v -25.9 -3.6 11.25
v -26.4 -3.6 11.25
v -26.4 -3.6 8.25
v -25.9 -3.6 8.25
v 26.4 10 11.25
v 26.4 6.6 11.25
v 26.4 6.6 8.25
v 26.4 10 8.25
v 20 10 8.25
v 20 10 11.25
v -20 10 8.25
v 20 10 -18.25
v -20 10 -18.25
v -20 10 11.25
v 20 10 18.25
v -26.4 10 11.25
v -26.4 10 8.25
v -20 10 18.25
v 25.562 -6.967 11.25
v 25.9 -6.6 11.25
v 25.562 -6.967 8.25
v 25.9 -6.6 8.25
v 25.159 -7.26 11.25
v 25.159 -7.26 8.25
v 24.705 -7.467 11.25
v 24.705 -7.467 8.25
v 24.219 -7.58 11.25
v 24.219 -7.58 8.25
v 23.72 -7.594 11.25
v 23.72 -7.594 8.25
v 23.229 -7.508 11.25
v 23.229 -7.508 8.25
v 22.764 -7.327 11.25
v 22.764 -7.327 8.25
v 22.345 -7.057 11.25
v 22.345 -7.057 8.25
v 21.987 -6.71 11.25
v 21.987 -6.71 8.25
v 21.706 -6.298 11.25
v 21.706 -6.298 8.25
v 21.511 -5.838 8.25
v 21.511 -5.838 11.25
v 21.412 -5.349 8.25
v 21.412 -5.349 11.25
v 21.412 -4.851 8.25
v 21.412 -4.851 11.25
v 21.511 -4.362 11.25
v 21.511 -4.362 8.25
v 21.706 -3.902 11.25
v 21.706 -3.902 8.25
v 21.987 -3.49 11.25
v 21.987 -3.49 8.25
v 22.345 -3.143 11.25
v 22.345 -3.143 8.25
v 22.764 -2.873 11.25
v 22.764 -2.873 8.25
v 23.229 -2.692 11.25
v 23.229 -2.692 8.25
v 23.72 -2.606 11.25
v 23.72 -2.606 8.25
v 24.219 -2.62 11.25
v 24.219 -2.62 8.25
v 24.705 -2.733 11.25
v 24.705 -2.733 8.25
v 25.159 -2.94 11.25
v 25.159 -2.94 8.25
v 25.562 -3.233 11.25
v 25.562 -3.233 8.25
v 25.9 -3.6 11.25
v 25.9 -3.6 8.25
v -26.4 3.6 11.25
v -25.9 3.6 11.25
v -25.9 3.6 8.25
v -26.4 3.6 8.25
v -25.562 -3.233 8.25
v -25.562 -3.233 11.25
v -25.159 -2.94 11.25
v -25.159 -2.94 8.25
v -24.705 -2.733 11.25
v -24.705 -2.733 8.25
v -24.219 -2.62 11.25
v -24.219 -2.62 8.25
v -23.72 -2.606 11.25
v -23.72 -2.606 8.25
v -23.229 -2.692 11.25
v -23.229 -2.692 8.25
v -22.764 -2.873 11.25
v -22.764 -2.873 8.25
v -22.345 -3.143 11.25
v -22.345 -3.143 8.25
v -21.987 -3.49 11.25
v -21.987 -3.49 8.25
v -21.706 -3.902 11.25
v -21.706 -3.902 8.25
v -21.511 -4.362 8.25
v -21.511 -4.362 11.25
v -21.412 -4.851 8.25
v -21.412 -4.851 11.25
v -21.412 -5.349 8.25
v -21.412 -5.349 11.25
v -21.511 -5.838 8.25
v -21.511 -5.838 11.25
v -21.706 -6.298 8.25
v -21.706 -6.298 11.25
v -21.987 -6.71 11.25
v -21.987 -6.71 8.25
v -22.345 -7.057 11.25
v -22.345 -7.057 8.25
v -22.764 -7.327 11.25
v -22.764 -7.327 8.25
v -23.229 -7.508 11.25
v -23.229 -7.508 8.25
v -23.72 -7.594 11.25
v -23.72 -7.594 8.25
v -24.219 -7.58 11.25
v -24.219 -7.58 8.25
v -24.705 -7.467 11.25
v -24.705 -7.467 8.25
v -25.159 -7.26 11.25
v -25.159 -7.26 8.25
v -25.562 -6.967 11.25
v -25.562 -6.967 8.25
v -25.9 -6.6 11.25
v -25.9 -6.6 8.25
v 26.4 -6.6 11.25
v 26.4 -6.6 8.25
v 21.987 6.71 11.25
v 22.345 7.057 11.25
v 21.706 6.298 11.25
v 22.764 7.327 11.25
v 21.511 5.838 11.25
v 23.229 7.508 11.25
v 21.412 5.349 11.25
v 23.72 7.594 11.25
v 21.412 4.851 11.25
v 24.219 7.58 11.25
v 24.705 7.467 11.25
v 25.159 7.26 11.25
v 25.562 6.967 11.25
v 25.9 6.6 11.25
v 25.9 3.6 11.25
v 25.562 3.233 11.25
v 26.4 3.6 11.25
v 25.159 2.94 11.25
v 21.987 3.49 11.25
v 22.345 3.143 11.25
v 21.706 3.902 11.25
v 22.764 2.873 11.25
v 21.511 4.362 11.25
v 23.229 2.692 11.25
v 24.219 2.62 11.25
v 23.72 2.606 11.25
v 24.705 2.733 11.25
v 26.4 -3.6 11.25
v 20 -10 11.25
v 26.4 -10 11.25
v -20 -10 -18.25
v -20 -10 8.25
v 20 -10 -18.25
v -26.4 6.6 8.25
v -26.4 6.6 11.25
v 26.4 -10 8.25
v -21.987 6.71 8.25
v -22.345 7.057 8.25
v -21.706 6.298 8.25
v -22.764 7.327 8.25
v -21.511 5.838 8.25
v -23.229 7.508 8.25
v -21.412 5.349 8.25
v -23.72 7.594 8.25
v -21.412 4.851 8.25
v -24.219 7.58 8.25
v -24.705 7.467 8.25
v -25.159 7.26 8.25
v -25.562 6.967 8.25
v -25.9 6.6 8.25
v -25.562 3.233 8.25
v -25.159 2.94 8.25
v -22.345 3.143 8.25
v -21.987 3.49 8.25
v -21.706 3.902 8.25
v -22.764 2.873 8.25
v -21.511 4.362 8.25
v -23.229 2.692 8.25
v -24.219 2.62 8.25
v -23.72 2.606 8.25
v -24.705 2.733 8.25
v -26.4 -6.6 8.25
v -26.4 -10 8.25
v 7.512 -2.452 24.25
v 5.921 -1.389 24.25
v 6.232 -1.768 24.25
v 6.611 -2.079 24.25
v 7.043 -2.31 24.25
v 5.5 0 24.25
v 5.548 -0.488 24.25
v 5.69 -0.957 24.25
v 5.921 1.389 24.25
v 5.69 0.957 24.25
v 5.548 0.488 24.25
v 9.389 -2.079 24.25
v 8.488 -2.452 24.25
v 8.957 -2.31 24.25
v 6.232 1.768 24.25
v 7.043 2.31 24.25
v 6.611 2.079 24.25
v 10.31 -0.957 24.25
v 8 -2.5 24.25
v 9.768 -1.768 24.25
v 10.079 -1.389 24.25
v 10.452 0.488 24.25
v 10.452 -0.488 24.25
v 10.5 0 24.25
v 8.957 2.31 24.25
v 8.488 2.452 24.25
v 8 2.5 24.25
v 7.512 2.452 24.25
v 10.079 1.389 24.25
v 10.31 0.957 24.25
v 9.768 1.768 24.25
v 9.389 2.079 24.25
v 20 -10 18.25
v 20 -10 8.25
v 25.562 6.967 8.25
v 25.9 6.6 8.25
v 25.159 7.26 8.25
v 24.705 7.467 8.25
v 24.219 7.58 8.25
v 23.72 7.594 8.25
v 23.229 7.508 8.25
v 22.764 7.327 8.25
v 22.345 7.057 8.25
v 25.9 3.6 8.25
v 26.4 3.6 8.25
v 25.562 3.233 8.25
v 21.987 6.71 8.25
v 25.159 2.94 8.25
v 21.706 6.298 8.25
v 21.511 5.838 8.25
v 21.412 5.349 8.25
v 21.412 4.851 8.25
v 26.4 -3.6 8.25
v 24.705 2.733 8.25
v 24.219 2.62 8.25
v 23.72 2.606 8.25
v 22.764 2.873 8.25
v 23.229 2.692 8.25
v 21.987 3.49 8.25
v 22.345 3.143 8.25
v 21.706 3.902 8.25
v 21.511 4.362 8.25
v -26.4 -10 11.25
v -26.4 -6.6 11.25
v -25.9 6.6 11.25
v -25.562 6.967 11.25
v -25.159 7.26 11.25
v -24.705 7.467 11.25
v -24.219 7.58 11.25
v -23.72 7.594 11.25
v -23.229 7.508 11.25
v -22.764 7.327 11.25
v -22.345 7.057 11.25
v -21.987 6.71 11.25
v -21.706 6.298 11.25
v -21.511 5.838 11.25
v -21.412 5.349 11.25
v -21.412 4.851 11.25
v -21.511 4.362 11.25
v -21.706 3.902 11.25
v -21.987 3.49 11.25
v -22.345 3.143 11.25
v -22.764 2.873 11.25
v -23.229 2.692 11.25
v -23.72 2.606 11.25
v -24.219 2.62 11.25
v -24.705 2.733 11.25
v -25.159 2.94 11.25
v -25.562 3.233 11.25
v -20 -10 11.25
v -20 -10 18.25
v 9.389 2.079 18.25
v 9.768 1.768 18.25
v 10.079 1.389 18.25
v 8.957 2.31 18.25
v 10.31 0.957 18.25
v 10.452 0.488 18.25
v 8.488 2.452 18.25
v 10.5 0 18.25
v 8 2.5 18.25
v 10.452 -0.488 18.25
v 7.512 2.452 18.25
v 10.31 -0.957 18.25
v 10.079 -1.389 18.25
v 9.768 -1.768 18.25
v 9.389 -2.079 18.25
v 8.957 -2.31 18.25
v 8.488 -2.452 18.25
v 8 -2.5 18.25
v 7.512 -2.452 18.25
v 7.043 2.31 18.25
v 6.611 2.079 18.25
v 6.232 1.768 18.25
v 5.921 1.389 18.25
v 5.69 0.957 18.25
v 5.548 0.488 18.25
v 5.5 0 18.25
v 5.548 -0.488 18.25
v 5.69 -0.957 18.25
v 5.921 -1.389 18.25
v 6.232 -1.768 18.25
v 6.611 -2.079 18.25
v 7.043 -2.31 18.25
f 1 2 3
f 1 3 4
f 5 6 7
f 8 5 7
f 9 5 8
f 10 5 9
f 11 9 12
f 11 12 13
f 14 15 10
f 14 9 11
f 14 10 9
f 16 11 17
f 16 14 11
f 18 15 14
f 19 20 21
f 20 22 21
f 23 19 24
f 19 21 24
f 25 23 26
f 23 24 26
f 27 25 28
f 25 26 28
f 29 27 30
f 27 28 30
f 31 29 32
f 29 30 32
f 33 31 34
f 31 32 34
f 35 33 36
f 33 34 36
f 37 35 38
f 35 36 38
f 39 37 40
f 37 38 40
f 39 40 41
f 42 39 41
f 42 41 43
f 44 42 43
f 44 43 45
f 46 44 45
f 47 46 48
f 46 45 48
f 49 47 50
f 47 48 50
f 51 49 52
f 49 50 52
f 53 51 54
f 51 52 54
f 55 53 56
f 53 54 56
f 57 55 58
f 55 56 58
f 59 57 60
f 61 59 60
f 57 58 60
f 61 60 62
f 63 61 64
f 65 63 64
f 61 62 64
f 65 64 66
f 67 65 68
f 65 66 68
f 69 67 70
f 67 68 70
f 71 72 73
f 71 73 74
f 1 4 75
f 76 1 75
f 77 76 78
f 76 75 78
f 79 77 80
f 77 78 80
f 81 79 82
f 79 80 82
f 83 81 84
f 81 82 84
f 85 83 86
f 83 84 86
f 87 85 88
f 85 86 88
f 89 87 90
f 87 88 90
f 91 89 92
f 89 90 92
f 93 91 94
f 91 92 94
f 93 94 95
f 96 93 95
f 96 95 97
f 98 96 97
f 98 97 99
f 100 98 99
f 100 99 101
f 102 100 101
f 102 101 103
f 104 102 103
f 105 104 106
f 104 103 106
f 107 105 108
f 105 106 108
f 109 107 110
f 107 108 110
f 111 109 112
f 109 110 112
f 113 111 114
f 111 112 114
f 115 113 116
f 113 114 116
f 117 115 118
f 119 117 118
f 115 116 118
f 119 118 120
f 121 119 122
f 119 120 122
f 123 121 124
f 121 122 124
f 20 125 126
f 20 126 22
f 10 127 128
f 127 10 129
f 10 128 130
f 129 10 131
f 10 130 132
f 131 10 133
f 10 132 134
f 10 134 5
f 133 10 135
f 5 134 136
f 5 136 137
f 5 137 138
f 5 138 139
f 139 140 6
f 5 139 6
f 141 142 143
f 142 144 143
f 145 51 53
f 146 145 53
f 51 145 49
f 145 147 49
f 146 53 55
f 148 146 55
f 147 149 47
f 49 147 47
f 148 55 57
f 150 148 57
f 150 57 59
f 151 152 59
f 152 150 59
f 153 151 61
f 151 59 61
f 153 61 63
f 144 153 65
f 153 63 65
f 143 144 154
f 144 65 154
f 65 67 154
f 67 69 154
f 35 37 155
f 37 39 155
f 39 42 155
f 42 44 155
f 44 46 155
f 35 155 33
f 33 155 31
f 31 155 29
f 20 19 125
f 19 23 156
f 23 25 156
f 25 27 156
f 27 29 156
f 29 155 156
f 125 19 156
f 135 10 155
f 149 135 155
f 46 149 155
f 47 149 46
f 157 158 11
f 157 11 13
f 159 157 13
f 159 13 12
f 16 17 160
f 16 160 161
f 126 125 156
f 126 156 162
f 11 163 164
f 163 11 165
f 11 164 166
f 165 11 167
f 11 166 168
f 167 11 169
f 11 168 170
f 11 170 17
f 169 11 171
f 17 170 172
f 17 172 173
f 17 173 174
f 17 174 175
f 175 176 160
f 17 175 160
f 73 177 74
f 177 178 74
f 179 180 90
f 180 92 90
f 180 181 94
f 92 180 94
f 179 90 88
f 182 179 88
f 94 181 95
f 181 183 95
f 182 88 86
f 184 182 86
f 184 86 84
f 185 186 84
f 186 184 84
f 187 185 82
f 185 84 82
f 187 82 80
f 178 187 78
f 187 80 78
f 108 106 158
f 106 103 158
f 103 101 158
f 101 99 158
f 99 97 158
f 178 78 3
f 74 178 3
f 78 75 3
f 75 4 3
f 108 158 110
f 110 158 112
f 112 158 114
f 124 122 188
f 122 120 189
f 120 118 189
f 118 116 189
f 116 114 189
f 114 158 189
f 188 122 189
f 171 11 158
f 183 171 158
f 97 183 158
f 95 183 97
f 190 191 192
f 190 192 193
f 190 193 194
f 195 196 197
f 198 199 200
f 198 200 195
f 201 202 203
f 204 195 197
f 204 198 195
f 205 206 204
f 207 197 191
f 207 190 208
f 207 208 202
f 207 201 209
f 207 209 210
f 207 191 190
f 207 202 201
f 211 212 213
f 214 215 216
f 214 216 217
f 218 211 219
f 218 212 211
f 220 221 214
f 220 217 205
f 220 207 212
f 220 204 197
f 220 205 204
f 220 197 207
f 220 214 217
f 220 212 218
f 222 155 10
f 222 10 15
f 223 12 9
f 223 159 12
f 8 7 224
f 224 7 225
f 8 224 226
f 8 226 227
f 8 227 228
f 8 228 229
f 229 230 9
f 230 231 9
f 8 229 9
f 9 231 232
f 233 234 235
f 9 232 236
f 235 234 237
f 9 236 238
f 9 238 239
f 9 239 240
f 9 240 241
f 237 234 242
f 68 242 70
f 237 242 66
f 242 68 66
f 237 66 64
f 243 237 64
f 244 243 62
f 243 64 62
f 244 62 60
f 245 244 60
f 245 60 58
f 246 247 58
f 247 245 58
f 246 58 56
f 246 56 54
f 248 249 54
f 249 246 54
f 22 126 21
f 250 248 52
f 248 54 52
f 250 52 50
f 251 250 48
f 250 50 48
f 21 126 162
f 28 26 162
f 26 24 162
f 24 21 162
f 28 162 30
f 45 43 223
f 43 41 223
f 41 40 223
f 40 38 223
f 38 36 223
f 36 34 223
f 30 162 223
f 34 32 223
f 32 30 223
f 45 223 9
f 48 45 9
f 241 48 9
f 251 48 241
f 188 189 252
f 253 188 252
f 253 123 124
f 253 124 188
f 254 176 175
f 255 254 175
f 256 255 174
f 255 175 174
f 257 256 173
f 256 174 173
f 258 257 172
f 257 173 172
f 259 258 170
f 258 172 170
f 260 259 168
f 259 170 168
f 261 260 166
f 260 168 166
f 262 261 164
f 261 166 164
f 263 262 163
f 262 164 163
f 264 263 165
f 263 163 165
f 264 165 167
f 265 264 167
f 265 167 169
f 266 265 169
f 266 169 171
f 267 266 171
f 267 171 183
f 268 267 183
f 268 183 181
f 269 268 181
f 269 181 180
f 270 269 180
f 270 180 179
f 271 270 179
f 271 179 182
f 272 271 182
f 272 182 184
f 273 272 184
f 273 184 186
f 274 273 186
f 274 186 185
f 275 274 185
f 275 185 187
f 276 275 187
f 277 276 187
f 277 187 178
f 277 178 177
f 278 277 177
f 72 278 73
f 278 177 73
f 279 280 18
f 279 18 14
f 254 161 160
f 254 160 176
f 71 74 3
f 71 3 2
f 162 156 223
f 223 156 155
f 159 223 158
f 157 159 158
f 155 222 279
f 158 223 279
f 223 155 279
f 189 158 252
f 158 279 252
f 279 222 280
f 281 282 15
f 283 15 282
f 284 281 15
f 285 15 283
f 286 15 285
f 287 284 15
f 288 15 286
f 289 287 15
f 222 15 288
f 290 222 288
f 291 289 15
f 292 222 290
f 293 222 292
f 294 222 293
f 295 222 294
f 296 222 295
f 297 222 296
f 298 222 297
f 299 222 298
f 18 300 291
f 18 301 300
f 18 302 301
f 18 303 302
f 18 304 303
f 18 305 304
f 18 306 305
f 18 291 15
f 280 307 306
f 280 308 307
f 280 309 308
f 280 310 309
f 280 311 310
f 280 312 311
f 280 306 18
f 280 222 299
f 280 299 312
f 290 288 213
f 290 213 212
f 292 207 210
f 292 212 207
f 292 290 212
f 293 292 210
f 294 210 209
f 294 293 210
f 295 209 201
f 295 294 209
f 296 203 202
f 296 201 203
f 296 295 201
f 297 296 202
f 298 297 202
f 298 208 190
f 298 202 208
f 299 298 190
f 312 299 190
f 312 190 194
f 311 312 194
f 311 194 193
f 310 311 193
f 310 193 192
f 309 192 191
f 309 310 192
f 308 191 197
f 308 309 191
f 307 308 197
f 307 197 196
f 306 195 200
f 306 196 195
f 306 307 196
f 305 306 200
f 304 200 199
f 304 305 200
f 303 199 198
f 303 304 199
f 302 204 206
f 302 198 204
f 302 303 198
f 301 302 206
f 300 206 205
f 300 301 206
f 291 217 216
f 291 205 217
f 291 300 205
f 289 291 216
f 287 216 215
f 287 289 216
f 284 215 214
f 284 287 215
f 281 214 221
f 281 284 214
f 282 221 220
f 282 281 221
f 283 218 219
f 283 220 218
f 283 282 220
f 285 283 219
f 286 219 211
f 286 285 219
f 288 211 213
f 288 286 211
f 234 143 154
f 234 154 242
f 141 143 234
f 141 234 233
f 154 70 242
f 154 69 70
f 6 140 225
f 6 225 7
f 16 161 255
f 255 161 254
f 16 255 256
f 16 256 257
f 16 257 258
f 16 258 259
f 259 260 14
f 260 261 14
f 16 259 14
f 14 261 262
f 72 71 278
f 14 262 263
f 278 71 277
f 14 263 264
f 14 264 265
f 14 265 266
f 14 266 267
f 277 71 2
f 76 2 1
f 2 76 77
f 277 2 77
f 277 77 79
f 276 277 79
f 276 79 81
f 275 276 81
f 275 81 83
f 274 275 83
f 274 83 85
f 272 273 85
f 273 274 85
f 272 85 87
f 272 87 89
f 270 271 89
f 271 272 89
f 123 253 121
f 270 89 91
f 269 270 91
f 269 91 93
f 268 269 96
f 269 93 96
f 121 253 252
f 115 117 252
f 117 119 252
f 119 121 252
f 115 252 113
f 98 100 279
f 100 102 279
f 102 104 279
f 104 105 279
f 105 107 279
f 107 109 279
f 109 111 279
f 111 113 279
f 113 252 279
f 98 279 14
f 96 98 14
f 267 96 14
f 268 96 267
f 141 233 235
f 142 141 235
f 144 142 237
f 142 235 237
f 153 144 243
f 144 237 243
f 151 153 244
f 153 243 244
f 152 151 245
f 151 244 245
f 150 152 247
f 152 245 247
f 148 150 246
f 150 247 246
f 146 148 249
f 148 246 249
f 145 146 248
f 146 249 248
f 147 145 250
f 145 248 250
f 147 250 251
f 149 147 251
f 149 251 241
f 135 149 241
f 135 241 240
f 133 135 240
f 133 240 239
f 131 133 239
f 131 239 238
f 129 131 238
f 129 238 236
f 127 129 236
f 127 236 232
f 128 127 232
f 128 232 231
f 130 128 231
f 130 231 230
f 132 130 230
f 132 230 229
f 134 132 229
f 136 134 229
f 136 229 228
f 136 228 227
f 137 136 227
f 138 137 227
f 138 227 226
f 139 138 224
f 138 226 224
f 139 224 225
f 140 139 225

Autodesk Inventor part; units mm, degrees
ref_plane "YZ Plane" through (0, 0, 0) normal (1, 0, 0) x (0, 1, 0)
ref_plane "XZ Plane" through (0, 0, 0) normal (0, 1, 0) x (-1, 0, 0)
ref_plane "XY Plane" through (0, 0, 0) normal (0, 0, 1) x (1, 0, 0)
sketch "草圖1" plane through (0, 0, 0) normal (0, 1, 0) x (-1, 0, 0)
  line L0 (20, -18.25) -> (-20, -18.25)
  line L1 (-20, -18.25) -> (-20, 18.25)
  line L2 (-20, 18.25) -> (20, 18.25)
  line L3 (20, 18.25) -> (20, -18.25)
  line L4 (20, -18.25) -> (-20, 18.25) construction
  line L5 (-20, -18.25) -> (20, 18.25) construction
  line L6 (26.4, 11.25) -> (-26.4, 11.25)
  line L7 (-26.4, 11.25) -> (-26.4, 8.25)
  line L8 (-26.4, 8.25) -> (26.4, 8.25)
  line L9 (26.4, 8.25) -> (26.4, 11.25)
  point P0 (0, 0)
  point P1 (0, 11.25)
  point P2 (0, 18.25)
  dimension "d0" = 40
  dimension "d1" = 36.5
  dimension "d2" = 3
  dimension "d4" = 52.8
  dimension "d5" = 26.5
extrude "擠出1" add sketch "草圖1" along normal mid plane 20
sketch "草圖2" plane through (20, -10, 11.25) normal (0, 0, 1) x (1, 0, 0)
  line L0 (-40, 0) -> (-40, 20) construction
  line L1 (0, 20) -> (-40, 20) construction
  line L2 (0, 20) -> (0, 0) construction
  line L3 (-40, 0) -> (0, 0) construction
  line L4 (-43.9, 4.9) -> (3.9, 4.9) construction
  line L5 (3.9, 4.9) -> (3.9, 15.1) construction
  line L6 (3.9, 15.1) -> (-43.9, 15.1) construction
  line L7 (-43.9, 15.1) -> (-43.9, 4.9) construction
  line L8 (-43.9, 4.9) -> (3.9, 15.1) construction
  line L9 (3.9, 4.9) -> (-43.9, 15.1) construction
  point P0 (-20, 10)
  dimension "d8" = 47.8
  dimension "d9" = 10.2
hole "孔1" at (23.9, 5.1, 11.25) at (23.9, -5.1, 11.25) at (-23.9, -5.1, 11.25) at (-23.9, 5.1, 11.25) direction (0, 0, -1) diameter 5 depth 8 tip angle 118
sketch "草圖3" plane through (20, -10, 11.25) normal (0, 0, 1) x (1, 0, 0)
  circle A0 centre (3.9, 15.1) radius 2.5 construction
  line L0 (3.9, 16.6) -> (13.7017, 16.6)
  line L1 (13.7017, 16.6) -> (13.7017, 13.6)
  line L2 (13.7017, 13.6) -> (3.9, 13.6)
  line L3 (3.9, 13.6) -> (3.9, 16.6)
  point P0 (-20, 10)
  point P1 (6.4, 15.1)
  dimension "d17" = 3
extrude "擠出2" cut sketch "草圖3" against normal blind 20
mirror "鏡射1" about plane through (0, 0, 0) normal (0, 1, 0) of "擠出2"
mirror "鏡射2" about plane through (0, 0, 0) normal (1, 0, 0) of "擠出2", "鏡射1"
sketch "草圖4" plane through (-20, 10, 18.25) normal (0, 0, 1) x (1, 0, 0)
  circle A0 centre (28, -10) radius 2.5
  line L0 (40, 0) -> (40, -20) construction
  line L1 (0, 0) -> (0, -20) projected
  point P0 (20, -10)
  dimension "d20" = 5
  dimension "d25" = 12
extrude "擠出3" add sketch "草圖4" along normal blind 6
properties part number "馬達"
